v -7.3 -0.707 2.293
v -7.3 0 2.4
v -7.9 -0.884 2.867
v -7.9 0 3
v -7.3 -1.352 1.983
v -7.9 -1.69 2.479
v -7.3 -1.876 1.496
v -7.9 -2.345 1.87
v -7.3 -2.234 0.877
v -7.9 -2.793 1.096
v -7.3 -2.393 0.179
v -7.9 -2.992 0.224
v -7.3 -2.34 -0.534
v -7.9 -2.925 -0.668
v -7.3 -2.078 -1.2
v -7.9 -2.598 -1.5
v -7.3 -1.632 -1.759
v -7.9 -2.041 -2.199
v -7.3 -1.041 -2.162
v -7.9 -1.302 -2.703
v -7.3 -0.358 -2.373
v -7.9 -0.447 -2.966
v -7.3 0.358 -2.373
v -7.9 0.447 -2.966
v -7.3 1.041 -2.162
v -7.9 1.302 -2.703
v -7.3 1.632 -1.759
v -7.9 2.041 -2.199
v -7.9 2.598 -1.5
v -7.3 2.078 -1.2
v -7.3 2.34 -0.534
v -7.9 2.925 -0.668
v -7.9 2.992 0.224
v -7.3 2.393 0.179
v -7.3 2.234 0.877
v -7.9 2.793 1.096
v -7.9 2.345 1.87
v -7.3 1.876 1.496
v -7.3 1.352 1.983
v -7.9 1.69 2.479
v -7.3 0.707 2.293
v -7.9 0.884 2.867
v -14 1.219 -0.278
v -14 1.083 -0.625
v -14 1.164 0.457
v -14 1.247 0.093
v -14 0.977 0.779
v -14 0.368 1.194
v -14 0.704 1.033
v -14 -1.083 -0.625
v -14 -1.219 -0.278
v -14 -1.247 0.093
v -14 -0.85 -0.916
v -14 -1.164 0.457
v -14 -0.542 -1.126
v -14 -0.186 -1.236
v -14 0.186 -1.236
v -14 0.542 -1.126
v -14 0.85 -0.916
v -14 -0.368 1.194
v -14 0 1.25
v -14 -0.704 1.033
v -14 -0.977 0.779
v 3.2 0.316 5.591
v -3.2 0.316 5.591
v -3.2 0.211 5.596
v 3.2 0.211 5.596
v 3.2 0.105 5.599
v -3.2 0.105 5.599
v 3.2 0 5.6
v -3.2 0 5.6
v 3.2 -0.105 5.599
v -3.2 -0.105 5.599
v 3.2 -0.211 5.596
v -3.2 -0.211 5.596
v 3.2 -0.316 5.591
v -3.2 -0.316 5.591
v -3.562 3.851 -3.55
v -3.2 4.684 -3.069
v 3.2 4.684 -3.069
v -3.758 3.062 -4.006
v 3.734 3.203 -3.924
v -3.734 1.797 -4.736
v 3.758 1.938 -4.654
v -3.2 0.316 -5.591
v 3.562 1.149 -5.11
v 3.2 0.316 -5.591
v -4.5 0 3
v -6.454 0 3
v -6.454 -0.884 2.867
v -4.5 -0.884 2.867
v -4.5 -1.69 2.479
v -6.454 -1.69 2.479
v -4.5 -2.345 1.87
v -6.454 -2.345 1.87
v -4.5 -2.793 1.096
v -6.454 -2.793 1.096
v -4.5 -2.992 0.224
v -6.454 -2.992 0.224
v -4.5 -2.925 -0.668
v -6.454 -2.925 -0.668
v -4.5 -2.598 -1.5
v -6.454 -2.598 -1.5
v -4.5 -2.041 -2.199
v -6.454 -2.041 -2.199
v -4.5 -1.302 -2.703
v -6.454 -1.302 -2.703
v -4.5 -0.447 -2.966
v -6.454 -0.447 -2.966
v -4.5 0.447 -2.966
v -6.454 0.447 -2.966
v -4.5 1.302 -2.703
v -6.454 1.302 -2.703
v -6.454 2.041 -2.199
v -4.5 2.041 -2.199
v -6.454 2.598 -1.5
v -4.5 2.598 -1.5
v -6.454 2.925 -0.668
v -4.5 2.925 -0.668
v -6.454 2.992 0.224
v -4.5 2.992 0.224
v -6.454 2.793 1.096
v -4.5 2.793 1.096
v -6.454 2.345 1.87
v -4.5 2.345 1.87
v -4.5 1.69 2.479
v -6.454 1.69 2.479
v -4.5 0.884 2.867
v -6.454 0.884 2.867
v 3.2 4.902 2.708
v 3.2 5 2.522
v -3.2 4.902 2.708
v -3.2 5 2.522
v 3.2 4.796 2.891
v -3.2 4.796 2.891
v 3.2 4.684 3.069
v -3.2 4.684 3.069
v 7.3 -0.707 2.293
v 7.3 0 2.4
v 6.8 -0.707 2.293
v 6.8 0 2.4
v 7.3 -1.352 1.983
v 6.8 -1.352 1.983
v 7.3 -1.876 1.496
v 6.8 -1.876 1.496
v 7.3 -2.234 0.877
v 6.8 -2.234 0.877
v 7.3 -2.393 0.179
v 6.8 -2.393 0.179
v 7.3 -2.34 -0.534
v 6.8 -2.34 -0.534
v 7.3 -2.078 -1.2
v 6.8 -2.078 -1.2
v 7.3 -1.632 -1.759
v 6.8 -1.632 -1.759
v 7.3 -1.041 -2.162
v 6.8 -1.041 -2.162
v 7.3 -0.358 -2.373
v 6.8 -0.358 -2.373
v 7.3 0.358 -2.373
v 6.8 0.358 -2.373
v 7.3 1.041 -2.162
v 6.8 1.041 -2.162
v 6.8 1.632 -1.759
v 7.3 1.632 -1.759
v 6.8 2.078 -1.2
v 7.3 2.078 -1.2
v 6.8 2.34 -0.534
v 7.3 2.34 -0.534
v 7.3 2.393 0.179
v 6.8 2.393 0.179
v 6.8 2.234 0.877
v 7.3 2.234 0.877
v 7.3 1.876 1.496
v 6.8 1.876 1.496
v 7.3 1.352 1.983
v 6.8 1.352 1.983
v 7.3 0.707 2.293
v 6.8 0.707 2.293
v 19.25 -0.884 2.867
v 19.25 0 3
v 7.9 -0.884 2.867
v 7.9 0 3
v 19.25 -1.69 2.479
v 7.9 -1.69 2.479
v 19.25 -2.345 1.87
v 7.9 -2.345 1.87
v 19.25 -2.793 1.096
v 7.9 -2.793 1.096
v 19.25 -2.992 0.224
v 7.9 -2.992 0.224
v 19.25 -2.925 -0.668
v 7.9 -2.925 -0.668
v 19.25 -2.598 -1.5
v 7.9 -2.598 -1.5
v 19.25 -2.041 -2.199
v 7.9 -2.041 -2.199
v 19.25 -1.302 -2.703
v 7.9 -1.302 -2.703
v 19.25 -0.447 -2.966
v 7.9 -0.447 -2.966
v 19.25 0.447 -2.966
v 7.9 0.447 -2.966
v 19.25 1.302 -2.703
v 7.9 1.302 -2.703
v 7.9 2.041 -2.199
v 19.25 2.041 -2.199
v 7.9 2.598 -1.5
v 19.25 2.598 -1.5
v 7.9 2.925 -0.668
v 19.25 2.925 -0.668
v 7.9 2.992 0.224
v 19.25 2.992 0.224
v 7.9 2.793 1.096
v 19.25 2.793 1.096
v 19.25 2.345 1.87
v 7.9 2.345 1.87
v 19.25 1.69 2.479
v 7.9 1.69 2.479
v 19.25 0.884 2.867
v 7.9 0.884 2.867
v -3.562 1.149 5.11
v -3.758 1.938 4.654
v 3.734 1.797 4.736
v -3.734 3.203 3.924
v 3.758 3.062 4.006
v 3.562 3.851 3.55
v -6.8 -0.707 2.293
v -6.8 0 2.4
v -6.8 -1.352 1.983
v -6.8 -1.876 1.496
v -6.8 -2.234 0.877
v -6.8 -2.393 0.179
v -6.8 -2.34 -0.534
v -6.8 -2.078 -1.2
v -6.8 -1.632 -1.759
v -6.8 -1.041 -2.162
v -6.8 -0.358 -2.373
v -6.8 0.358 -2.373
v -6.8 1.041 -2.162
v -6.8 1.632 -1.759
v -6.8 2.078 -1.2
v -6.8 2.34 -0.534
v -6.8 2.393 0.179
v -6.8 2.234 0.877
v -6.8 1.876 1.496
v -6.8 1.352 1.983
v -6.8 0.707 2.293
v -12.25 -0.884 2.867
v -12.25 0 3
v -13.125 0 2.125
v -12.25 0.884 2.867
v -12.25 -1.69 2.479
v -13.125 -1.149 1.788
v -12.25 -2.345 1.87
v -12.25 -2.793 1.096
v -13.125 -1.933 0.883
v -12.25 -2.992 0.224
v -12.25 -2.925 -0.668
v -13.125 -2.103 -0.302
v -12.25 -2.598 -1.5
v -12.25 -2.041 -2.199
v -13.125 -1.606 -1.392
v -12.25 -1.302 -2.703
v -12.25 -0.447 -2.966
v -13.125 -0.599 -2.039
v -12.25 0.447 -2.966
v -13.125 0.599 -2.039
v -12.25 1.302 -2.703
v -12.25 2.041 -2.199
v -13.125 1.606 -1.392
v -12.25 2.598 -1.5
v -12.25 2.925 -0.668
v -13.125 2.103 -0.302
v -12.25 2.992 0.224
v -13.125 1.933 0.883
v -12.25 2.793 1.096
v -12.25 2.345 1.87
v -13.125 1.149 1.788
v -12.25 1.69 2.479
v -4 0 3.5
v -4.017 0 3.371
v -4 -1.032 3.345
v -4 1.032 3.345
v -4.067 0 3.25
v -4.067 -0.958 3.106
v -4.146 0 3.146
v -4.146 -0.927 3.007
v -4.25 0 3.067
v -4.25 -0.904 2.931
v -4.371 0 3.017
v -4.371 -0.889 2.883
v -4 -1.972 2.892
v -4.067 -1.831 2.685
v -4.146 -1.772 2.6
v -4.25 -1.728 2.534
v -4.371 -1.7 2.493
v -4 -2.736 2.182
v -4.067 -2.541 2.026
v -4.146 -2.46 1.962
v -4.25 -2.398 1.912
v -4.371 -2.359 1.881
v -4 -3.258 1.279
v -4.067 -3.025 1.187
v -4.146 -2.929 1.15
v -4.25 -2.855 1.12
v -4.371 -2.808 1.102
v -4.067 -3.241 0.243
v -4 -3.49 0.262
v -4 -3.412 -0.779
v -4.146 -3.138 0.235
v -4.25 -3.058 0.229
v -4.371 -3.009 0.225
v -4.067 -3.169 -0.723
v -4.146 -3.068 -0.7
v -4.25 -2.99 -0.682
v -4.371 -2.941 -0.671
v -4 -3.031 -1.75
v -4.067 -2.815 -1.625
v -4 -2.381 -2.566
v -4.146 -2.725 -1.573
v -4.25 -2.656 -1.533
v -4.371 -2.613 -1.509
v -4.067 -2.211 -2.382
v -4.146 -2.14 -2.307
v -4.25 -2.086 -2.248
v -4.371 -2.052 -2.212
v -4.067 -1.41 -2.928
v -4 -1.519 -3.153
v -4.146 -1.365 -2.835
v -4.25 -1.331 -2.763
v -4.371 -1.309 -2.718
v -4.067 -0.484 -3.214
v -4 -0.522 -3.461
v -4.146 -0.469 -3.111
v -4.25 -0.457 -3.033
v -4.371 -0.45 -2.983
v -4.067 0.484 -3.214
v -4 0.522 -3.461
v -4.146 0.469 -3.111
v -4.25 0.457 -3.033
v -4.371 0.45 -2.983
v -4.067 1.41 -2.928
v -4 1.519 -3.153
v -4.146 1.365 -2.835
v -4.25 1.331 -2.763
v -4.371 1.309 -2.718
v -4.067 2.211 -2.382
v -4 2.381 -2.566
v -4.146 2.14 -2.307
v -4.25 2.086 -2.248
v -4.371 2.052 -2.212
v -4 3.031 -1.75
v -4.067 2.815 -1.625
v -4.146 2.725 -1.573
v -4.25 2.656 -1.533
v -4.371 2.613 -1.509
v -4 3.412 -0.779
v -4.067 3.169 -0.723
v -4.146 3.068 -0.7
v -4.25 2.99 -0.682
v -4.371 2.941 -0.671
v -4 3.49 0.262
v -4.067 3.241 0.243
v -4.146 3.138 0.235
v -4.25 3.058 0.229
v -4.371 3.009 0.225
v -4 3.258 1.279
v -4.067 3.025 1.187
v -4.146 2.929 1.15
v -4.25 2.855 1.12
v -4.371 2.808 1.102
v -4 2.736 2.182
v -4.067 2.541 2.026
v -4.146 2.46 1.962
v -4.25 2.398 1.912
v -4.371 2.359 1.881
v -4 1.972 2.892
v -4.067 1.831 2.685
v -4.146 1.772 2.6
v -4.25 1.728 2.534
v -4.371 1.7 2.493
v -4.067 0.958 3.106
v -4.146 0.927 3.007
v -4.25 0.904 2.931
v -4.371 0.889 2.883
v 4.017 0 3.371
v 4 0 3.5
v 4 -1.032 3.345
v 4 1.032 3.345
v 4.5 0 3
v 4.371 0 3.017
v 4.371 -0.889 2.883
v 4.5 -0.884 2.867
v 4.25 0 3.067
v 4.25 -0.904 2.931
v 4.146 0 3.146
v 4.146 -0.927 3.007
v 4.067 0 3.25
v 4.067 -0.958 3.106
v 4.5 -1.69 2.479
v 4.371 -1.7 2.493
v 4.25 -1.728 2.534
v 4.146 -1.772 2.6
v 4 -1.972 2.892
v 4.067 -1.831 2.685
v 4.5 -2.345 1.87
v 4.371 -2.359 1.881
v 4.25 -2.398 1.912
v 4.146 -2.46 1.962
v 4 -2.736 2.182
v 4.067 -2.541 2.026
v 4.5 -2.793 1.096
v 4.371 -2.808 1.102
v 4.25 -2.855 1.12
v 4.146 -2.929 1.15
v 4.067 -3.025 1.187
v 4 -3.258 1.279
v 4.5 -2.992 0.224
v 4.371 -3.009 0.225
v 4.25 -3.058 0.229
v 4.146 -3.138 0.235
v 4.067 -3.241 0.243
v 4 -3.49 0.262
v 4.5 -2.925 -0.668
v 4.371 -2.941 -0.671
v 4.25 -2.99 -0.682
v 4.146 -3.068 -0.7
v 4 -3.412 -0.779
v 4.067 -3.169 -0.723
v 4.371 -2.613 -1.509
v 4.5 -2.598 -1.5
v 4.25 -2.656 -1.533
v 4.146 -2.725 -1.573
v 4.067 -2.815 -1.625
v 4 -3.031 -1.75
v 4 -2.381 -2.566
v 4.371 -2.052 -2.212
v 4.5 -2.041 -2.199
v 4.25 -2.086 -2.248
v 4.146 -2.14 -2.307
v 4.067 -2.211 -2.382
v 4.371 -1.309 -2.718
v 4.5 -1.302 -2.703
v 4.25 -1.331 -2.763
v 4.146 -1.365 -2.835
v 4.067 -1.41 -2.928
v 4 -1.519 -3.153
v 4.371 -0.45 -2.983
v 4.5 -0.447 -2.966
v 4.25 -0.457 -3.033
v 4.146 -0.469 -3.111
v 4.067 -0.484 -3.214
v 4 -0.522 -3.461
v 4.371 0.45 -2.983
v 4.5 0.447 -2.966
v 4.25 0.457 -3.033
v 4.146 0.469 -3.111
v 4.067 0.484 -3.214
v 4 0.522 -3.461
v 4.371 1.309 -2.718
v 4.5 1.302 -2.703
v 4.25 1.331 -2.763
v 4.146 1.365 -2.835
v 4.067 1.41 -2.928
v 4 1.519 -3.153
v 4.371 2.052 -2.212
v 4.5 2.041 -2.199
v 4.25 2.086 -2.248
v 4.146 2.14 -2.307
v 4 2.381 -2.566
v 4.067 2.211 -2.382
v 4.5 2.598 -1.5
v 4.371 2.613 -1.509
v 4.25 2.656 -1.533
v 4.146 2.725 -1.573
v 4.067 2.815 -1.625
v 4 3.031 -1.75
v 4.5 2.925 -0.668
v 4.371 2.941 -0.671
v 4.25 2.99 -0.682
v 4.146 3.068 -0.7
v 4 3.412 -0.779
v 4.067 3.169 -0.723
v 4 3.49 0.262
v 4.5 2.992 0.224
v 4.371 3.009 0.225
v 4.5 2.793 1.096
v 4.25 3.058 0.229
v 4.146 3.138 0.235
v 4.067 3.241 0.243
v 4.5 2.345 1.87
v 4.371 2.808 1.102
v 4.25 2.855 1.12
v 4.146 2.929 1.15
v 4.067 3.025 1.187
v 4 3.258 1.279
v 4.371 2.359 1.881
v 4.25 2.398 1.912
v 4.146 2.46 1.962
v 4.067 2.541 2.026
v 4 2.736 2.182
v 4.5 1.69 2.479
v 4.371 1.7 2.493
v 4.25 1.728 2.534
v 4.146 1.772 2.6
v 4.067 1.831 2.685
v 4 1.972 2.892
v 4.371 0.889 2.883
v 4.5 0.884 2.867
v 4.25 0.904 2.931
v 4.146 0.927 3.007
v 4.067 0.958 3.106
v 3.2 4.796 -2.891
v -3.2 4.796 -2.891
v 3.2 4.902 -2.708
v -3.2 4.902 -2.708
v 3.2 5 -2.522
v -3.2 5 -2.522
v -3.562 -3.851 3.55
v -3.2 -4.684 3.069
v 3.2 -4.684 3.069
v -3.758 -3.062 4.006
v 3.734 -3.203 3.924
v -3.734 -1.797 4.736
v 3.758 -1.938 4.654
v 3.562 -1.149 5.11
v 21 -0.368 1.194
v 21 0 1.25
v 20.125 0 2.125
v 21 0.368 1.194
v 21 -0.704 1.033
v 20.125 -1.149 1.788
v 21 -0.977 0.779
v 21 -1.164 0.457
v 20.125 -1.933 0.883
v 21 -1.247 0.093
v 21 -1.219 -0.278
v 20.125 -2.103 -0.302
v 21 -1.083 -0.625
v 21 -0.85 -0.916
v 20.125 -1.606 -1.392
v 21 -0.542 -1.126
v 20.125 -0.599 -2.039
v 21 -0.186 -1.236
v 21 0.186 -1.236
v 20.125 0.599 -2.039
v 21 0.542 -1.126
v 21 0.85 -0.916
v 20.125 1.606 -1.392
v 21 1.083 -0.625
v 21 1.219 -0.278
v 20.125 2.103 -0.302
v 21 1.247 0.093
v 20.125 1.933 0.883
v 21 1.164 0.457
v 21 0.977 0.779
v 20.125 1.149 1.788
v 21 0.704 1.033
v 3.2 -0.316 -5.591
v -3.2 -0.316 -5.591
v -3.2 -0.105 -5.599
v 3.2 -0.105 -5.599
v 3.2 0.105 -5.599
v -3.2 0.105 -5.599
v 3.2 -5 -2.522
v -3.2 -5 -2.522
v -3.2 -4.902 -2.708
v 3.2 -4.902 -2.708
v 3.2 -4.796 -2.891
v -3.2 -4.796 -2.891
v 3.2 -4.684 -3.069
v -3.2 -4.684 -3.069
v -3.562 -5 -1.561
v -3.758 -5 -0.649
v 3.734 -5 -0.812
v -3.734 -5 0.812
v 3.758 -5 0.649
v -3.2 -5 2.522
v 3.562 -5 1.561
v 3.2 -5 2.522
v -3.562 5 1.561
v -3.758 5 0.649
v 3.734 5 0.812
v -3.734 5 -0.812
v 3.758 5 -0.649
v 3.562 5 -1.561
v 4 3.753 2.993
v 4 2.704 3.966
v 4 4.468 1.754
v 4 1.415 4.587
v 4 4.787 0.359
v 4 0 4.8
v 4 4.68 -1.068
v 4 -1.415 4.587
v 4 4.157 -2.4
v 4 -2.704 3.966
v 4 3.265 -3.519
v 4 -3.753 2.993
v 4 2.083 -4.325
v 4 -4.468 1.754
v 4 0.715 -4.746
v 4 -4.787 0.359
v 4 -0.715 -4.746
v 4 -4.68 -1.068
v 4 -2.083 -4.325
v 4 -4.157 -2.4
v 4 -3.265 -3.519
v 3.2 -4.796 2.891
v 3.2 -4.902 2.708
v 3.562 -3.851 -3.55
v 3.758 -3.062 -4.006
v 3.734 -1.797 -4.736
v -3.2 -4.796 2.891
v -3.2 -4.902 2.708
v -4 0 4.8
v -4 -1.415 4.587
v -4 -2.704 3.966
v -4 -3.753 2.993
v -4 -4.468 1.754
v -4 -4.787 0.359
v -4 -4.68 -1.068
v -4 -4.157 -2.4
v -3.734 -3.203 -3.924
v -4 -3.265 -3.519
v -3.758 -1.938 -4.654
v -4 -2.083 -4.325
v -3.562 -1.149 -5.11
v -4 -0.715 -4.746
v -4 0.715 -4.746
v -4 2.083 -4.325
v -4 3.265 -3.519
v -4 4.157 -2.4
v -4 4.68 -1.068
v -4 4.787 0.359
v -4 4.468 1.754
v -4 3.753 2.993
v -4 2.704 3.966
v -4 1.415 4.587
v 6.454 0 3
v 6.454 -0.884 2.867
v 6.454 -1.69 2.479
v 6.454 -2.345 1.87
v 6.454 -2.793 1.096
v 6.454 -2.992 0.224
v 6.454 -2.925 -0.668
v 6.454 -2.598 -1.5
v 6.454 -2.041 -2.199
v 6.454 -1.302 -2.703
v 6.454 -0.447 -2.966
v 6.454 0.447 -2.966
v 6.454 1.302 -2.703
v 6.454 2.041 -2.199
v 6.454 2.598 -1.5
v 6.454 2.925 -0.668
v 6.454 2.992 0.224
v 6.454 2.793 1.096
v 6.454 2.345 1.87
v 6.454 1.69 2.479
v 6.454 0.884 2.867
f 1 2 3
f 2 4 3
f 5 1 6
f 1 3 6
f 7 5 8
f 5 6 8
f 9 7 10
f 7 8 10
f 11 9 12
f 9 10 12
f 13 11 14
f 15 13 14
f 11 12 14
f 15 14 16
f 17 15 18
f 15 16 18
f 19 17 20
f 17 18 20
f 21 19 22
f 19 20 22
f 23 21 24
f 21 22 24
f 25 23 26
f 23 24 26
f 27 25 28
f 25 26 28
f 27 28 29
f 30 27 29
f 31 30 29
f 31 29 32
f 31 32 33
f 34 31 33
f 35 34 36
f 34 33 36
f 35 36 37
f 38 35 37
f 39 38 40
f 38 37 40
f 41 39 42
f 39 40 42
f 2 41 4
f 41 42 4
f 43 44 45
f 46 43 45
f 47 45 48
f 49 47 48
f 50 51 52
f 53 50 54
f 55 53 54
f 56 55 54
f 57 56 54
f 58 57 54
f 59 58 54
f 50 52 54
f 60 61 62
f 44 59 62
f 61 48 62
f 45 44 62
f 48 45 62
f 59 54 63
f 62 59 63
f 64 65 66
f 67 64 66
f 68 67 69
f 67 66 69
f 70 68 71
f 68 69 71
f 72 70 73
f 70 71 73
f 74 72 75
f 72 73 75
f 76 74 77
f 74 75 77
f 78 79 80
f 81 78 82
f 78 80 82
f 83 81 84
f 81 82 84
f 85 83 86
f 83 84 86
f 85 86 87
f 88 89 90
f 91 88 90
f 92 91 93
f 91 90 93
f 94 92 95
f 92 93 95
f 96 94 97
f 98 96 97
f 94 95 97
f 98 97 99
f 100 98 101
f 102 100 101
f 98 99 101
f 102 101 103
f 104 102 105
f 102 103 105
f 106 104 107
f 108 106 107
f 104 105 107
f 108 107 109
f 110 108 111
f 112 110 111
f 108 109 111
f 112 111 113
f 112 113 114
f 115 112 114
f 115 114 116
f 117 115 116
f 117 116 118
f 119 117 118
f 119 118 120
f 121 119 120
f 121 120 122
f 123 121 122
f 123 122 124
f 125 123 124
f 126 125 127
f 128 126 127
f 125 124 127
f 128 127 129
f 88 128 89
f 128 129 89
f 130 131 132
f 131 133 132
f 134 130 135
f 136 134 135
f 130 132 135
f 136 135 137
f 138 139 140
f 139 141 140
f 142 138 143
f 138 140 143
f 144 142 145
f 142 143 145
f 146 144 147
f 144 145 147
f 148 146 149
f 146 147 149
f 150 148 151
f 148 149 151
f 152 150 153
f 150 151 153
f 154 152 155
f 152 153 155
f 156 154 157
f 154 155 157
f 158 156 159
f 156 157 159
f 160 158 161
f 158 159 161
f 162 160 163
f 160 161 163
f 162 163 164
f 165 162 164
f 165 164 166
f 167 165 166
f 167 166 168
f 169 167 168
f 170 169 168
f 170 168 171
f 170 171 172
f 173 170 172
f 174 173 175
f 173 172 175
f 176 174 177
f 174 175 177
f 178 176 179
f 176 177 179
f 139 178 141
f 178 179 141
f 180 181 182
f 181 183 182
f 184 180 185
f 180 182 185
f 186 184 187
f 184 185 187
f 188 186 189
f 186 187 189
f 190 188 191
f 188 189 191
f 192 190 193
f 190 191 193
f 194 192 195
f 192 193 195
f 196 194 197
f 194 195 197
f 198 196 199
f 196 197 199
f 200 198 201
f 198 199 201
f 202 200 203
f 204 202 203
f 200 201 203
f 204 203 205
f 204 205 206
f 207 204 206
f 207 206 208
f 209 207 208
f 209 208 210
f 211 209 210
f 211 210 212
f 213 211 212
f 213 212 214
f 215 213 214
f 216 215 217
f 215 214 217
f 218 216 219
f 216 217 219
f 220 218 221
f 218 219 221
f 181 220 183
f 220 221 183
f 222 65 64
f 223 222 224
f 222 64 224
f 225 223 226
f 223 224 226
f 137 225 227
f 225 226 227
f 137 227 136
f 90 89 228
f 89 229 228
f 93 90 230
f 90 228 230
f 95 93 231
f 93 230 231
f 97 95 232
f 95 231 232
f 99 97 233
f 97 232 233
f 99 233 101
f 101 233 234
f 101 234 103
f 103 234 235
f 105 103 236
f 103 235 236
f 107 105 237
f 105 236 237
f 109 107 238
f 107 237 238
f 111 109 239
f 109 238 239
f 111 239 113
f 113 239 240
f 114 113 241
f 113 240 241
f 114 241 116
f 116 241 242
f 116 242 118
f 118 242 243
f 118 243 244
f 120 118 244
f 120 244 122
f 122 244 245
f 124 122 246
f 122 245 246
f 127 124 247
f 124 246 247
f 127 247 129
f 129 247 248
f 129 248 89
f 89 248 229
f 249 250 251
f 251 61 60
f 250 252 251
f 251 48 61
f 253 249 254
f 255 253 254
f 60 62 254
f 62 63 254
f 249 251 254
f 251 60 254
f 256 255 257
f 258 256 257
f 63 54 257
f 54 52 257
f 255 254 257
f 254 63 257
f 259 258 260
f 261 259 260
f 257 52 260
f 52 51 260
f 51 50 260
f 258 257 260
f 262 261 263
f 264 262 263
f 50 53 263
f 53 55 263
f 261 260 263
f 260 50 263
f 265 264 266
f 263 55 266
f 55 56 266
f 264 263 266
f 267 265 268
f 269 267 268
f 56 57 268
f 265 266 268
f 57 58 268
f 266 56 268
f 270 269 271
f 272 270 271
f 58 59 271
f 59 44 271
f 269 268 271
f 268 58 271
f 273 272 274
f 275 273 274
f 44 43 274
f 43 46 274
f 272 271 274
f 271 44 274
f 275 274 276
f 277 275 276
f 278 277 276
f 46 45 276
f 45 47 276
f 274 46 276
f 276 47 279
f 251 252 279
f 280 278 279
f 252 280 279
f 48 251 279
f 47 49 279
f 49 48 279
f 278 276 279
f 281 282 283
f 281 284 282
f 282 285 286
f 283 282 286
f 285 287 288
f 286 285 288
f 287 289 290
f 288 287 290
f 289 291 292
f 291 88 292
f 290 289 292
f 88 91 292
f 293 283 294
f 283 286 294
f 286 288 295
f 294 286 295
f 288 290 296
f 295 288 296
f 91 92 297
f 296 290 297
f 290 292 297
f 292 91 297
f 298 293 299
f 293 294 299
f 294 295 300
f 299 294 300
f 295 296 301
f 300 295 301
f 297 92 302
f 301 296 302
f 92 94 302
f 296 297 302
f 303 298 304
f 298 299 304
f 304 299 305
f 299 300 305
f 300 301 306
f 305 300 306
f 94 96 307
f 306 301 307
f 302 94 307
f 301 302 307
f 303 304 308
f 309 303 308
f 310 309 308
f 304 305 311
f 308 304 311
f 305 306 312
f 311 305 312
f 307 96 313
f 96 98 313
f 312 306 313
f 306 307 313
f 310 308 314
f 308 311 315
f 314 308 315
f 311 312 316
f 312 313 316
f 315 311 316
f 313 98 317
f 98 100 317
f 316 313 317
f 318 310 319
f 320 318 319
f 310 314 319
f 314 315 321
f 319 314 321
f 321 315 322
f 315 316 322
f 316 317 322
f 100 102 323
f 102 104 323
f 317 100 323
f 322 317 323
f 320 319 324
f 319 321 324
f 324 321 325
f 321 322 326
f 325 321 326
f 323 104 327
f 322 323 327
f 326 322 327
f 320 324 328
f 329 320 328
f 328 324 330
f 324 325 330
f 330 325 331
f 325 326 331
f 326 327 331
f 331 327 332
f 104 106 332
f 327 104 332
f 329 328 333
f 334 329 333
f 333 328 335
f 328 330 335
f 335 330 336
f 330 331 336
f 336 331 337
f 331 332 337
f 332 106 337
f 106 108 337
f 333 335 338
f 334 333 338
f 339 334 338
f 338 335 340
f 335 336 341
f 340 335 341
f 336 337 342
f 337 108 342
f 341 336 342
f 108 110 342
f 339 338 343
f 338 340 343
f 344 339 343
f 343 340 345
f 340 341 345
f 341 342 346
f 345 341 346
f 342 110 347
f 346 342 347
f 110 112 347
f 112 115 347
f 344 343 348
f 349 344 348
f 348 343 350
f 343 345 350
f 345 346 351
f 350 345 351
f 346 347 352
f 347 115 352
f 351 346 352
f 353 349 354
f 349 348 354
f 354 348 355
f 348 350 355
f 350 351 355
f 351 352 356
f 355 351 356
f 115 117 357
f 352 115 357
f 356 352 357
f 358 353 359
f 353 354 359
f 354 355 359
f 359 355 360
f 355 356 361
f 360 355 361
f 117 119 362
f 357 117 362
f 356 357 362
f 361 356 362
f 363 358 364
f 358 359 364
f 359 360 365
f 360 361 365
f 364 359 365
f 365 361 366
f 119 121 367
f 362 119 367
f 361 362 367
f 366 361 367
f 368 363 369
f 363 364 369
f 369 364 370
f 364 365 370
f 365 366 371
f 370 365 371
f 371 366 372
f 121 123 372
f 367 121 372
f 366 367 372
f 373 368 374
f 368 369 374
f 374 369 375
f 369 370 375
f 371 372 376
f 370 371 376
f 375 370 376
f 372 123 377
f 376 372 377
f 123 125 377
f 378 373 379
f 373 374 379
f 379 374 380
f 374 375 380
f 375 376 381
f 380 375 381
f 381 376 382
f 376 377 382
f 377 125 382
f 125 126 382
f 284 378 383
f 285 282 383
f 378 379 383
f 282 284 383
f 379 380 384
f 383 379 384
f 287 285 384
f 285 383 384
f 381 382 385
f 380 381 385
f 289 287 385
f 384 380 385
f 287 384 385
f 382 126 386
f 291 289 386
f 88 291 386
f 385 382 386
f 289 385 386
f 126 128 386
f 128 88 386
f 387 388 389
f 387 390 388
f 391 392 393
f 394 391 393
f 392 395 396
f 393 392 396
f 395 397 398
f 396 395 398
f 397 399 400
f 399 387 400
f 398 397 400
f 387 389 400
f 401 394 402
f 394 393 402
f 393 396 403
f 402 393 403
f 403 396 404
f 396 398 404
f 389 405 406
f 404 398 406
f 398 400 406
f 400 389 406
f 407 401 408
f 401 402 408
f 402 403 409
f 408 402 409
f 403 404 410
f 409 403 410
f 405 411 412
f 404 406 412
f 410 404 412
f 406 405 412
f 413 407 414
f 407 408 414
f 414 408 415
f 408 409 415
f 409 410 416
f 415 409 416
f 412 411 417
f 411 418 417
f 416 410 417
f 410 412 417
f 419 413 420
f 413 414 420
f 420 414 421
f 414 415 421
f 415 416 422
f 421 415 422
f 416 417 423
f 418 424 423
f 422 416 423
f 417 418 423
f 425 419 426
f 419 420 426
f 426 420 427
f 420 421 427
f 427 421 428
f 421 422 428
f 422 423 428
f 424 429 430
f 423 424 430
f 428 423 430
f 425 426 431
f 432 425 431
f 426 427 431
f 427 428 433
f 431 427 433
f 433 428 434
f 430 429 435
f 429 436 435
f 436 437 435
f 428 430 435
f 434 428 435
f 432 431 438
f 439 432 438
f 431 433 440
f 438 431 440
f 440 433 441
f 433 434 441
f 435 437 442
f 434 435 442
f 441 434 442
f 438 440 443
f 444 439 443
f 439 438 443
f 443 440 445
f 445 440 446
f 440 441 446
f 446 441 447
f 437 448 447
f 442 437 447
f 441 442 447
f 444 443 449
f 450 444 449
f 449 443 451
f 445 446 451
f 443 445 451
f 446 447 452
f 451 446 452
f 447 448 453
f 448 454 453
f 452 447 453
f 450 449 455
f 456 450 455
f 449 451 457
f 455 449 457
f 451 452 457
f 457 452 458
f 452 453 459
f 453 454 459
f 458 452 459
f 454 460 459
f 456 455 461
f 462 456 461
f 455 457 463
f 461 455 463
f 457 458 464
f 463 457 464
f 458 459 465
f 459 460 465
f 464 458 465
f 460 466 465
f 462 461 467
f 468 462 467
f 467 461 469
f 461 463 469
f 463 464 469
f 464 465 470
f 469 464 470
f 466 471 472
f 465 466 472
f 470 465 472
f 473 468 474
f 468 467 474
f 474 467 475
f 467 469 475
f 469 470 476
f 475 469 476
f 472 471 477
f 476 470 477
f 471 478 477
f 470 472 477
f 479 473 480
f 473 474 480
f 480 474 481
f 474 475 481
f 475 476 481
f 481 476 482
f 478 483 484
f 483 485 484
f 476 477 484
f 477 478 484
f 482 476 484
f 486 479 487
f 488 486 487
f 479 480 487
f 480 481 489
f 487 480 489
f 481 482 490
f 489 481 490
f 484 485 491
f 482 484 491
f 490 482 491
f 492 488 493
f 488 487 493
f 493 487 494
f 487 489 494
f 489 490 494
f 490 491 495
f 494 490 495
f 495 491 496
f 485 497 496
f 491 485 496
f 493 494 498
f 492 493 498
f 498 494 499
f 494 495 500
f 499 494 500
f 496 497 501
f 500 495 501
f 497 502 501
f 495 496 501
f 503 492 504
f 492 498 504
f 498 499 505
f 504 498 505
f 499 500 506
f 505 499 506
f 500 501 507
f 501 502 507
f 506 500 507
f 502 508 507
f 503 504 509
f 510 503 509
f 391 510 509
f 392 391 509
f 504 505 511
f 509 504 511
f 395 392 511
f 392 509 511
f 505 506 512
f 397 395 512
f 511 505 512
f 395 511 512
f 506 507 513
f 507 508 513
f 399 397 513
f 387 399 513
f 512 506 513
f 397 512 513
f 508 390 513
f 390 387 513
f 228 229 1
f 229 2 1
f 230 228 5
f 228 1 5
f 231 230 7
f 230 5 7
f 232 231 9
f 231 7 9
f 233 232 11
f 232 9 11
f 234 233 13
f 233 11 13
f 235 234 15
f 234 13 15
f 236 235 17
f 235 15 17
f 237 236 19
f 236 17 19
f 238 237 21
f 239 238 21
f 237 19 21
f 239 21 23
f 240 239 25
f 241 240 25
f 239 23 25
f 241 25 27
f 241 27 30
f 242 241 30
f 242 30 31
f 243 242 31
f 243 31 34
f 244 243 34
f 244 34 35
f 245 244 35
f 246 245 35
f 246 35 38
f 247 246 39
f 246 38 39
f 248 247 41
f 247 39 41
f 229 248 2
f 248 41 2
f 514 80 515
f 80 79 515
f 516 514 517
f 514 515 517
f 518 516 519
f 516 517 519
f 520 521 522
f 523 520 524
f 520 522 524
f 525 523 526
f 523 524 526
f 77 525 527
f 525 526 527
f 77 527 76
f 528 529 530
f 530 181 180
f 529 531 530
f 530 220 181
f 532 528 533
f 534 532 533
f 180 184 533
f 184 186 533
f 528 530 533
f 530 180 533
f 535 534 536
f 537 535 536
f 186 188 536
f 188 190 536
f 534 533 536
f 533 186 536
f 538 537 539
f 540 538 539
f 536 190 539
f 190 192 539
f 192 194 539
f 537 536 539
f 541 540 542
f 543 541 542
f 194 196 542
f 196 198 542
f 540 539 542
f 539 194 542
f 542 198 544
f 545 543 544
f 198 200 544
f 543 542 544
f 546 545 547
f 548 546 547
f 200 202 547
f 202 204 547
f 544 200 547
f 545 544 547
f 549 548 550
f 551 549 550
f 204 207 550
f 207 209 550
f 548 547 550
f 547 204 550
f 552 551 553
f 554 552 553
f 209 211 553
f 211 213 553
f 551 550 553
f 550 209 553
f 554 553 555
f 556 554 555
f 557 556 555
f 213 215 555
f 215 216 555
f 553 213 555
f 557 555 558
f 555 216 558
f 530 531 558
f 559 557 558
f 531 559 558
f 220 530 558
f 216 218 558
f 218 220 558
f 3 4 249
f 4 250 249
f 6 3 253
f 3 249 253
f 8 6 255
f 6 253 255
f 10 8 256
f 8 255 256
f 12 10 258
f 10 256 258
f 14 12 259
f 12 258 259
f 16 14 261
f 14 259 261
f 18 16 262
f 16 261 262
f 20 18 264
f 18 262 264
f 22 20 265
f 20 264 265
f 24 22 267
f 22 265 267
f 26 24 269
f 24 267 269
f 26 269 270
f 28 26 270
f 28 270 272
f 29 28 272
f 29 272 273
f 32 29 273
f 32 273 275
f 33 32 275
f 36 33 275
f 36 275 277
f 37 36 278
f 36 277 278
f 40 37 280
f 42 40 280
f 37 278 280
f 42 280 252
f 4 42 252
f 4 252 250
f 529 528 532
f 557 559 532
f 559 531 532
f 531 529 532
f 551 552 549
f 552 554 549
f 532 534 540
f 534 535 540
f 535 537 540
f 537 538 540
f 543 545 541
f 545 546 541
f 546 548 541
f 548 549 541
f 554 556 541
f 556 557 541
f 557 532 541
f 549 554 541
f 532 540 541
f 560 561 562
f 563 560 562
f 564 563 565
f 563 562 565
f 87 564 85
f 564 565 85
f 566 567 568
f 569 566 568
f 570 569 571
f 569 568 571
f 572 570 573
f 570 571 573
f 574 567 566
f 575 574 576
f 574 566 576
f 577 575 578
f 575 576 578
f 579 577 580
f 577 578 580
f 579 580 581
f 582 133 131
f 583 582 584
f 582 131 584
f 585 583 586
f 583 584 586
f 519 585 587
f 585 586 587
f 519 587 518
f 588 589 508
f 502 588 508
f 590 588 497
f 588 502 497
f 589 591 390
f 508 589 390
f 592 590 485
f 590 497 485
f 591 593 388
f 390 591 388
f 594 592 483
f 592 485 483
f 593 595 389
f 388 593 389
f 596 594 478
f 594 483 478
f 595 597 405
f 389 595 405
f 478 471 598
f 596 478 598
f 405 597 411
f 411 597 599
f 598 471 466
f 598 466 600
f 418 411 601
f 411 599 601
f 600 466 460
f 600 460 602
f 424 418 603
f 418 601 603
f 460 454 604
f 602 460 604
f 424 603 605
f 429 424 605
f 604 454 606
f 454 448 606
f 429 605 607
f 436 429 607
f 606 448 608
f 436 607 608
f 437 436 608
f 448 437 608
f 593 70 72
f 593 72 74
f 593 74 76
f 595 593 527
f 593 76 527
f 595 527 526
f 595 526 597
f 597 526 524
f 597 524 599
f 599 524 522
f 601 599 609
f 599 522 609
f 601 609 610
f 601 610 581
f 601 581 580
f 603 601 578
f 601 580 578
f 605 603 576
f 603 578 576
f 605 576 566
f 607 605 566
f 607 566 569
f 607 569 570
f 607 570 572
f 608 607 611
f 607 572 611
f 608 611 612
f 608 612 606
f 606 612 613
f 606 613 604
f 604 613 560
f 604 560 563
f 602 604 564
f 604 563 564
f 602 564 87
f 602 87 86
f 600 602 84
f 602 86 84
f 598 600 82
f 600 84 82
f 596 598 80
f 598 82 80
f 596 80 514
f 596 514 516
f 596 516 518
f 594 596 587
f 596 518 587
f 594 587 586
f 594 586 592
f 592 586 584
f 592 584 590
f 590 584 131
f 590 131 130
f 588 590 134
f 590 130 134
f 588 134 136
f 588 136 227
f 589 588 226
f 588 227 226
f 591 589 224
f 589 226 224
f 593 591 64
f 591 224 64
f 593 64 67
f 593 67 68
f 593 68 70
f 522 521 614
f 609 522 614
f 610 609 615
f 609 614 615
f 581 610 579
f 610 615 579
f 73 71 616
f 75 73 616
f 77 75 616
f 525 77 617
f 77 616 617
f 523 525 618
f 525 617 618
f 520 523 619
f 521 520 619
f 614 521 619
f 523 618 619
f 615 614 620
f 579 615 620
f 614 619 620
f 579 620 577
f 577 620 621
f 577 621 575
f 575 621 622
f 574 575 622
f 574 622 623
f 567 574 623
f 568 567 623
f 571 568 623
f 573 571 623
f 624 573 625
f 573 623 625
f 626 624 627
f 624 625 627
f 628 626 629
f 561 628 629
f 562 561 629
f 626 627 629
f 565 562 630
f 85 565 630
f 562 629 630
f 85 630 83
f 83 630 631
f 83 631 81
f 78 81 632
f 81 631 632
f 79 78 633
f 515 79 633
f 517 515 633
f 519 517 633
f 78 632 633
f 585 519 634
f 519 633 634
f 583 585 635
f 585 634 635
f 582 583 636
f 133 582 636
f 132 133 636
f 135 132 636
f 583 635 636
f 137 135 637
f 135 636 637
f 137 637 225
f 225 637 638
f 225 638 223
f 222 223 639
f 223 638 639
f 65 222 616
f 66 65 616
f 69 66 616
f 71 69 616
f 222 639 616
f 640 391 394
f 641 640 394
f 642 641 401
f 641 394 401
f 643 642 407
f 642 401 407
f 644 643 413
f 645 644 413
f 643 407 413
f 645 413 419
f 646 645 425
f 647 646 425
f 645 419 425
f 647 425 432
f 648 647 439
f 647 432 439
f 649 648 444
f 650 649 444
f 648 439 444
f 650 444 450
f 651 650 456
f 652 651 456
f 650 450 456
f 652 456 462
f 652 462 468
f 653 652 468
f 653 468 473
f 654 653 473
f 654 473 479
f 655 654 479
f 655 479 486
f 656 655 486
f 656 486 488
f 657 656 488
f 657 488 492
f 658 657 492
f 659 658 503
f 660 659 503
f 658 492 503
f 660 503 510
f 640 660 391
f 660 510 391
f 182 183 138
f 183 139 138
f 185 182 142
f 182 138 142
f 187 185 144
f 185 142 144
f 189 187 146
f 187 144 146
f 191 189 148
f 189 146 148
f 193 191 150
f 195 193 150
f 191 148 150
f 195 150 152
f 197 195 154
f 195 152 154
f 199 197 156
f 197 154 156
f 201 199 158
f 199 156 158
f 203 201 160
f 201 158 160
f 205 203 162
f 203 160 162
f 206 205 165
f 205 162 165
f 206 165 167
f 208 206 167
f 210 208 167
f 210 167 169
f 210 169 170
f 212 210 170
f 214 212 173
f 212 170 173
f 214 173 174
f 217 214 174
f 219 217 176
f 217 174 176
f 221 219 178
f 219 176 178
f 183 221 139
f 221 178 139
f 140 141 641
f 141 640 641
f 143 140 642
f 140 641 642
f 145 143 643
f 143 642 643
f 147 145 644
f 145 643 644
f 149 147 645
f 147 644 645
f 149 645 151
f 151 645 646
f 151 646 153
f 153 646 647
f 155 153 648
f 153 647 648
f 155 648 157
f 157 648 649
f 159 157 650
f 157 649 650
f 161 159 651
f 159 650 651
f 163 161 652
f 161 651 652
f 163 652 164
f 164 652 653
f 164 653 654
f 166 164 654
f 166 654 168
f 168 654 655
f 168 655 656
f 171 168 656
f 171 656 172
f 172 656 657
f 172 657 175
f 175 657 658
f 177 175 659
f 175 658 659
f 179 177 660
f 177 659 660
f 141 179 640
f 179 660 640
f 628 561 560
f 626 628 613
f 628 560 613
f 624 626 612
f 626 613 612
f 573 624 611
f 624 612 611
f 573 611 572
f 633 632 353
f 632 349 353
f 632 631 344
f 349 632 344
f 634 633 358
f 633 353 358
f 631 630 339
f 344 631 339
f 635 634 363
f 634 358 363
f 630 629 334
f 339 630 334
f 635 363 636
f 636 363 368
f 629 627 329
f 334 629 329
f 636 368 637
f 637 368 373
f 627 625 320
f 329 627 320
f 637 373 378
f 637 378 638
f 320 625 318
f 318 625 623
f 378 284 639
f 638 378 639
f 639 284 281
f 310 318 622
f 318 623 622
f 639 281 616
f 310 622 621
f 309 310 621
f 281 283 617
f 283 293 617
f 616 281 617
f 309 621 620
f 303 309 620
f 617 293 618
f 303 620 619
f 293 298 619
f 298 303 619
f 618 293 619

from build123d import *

# Parameters (mm, degrees)
F2_R     = 12.5
F3_DEPTH = 12.5
F4_R     = 0.5


# Not quite as in the source:
# - the program builds the solid bodies; features that only make, move or delete a surface that nothing else refers to are left out


with BuildPart() as f1:
    # F0 (on Front) → F1 (revolve)
    with BuildSketch(Plane.XZ):
        Polygon((-14, 0), (21, 0), (21, 1.25), (19.85, 2.4), (7.3, 2.4), (6.8, 2.4), (6.4535898385, 3), (4, 3), (4, 4.8), (3.2, 5.6), (-3.2, 5.6), (-4, 4.8), (-4, 3), (-6.4535898385, 3), (-6.8, 2.4), (-7.3, 2.4), (-12.85, 2.4), (-14, 1.25), align=None)
        Polygon((7.3, 2.4), (19.85, 2.4), (19.25, 3), (7.9, 3), align=None)
        Polygon((-12.25, 3), (-12.85, 2.4), (-7.3, 2.4), (-7.9, 3), align=None)
    revolve(axis=Axis((0, 0, 0), (1, 0, 0)))

    # F2 (on Right) → F3 (cut, symmetric)
    with BuildSketch(Plane.YZ):
        Circle(F2_R)
        Polygon((5, -2.8867513459), (0, -5.7735026919), (-5, -2.8867513459), (-5, 2.8867513459), (0, 5.7735026919), (5, 2.8867513459), align=None, mode=Mode.SUBTRACT)
    extrude(amount=F3_DEPTH, both=True, mode=Mode.SUBTRACT)

    # F4
    f4_edges = [f1.edges().sort_by_distance(p)[0] for p in [
        (-4, 0, -3),
        (4, 0, -3),
    ]]
    fillet(f4_edges, radius=F4_R)


solid = f1.part
